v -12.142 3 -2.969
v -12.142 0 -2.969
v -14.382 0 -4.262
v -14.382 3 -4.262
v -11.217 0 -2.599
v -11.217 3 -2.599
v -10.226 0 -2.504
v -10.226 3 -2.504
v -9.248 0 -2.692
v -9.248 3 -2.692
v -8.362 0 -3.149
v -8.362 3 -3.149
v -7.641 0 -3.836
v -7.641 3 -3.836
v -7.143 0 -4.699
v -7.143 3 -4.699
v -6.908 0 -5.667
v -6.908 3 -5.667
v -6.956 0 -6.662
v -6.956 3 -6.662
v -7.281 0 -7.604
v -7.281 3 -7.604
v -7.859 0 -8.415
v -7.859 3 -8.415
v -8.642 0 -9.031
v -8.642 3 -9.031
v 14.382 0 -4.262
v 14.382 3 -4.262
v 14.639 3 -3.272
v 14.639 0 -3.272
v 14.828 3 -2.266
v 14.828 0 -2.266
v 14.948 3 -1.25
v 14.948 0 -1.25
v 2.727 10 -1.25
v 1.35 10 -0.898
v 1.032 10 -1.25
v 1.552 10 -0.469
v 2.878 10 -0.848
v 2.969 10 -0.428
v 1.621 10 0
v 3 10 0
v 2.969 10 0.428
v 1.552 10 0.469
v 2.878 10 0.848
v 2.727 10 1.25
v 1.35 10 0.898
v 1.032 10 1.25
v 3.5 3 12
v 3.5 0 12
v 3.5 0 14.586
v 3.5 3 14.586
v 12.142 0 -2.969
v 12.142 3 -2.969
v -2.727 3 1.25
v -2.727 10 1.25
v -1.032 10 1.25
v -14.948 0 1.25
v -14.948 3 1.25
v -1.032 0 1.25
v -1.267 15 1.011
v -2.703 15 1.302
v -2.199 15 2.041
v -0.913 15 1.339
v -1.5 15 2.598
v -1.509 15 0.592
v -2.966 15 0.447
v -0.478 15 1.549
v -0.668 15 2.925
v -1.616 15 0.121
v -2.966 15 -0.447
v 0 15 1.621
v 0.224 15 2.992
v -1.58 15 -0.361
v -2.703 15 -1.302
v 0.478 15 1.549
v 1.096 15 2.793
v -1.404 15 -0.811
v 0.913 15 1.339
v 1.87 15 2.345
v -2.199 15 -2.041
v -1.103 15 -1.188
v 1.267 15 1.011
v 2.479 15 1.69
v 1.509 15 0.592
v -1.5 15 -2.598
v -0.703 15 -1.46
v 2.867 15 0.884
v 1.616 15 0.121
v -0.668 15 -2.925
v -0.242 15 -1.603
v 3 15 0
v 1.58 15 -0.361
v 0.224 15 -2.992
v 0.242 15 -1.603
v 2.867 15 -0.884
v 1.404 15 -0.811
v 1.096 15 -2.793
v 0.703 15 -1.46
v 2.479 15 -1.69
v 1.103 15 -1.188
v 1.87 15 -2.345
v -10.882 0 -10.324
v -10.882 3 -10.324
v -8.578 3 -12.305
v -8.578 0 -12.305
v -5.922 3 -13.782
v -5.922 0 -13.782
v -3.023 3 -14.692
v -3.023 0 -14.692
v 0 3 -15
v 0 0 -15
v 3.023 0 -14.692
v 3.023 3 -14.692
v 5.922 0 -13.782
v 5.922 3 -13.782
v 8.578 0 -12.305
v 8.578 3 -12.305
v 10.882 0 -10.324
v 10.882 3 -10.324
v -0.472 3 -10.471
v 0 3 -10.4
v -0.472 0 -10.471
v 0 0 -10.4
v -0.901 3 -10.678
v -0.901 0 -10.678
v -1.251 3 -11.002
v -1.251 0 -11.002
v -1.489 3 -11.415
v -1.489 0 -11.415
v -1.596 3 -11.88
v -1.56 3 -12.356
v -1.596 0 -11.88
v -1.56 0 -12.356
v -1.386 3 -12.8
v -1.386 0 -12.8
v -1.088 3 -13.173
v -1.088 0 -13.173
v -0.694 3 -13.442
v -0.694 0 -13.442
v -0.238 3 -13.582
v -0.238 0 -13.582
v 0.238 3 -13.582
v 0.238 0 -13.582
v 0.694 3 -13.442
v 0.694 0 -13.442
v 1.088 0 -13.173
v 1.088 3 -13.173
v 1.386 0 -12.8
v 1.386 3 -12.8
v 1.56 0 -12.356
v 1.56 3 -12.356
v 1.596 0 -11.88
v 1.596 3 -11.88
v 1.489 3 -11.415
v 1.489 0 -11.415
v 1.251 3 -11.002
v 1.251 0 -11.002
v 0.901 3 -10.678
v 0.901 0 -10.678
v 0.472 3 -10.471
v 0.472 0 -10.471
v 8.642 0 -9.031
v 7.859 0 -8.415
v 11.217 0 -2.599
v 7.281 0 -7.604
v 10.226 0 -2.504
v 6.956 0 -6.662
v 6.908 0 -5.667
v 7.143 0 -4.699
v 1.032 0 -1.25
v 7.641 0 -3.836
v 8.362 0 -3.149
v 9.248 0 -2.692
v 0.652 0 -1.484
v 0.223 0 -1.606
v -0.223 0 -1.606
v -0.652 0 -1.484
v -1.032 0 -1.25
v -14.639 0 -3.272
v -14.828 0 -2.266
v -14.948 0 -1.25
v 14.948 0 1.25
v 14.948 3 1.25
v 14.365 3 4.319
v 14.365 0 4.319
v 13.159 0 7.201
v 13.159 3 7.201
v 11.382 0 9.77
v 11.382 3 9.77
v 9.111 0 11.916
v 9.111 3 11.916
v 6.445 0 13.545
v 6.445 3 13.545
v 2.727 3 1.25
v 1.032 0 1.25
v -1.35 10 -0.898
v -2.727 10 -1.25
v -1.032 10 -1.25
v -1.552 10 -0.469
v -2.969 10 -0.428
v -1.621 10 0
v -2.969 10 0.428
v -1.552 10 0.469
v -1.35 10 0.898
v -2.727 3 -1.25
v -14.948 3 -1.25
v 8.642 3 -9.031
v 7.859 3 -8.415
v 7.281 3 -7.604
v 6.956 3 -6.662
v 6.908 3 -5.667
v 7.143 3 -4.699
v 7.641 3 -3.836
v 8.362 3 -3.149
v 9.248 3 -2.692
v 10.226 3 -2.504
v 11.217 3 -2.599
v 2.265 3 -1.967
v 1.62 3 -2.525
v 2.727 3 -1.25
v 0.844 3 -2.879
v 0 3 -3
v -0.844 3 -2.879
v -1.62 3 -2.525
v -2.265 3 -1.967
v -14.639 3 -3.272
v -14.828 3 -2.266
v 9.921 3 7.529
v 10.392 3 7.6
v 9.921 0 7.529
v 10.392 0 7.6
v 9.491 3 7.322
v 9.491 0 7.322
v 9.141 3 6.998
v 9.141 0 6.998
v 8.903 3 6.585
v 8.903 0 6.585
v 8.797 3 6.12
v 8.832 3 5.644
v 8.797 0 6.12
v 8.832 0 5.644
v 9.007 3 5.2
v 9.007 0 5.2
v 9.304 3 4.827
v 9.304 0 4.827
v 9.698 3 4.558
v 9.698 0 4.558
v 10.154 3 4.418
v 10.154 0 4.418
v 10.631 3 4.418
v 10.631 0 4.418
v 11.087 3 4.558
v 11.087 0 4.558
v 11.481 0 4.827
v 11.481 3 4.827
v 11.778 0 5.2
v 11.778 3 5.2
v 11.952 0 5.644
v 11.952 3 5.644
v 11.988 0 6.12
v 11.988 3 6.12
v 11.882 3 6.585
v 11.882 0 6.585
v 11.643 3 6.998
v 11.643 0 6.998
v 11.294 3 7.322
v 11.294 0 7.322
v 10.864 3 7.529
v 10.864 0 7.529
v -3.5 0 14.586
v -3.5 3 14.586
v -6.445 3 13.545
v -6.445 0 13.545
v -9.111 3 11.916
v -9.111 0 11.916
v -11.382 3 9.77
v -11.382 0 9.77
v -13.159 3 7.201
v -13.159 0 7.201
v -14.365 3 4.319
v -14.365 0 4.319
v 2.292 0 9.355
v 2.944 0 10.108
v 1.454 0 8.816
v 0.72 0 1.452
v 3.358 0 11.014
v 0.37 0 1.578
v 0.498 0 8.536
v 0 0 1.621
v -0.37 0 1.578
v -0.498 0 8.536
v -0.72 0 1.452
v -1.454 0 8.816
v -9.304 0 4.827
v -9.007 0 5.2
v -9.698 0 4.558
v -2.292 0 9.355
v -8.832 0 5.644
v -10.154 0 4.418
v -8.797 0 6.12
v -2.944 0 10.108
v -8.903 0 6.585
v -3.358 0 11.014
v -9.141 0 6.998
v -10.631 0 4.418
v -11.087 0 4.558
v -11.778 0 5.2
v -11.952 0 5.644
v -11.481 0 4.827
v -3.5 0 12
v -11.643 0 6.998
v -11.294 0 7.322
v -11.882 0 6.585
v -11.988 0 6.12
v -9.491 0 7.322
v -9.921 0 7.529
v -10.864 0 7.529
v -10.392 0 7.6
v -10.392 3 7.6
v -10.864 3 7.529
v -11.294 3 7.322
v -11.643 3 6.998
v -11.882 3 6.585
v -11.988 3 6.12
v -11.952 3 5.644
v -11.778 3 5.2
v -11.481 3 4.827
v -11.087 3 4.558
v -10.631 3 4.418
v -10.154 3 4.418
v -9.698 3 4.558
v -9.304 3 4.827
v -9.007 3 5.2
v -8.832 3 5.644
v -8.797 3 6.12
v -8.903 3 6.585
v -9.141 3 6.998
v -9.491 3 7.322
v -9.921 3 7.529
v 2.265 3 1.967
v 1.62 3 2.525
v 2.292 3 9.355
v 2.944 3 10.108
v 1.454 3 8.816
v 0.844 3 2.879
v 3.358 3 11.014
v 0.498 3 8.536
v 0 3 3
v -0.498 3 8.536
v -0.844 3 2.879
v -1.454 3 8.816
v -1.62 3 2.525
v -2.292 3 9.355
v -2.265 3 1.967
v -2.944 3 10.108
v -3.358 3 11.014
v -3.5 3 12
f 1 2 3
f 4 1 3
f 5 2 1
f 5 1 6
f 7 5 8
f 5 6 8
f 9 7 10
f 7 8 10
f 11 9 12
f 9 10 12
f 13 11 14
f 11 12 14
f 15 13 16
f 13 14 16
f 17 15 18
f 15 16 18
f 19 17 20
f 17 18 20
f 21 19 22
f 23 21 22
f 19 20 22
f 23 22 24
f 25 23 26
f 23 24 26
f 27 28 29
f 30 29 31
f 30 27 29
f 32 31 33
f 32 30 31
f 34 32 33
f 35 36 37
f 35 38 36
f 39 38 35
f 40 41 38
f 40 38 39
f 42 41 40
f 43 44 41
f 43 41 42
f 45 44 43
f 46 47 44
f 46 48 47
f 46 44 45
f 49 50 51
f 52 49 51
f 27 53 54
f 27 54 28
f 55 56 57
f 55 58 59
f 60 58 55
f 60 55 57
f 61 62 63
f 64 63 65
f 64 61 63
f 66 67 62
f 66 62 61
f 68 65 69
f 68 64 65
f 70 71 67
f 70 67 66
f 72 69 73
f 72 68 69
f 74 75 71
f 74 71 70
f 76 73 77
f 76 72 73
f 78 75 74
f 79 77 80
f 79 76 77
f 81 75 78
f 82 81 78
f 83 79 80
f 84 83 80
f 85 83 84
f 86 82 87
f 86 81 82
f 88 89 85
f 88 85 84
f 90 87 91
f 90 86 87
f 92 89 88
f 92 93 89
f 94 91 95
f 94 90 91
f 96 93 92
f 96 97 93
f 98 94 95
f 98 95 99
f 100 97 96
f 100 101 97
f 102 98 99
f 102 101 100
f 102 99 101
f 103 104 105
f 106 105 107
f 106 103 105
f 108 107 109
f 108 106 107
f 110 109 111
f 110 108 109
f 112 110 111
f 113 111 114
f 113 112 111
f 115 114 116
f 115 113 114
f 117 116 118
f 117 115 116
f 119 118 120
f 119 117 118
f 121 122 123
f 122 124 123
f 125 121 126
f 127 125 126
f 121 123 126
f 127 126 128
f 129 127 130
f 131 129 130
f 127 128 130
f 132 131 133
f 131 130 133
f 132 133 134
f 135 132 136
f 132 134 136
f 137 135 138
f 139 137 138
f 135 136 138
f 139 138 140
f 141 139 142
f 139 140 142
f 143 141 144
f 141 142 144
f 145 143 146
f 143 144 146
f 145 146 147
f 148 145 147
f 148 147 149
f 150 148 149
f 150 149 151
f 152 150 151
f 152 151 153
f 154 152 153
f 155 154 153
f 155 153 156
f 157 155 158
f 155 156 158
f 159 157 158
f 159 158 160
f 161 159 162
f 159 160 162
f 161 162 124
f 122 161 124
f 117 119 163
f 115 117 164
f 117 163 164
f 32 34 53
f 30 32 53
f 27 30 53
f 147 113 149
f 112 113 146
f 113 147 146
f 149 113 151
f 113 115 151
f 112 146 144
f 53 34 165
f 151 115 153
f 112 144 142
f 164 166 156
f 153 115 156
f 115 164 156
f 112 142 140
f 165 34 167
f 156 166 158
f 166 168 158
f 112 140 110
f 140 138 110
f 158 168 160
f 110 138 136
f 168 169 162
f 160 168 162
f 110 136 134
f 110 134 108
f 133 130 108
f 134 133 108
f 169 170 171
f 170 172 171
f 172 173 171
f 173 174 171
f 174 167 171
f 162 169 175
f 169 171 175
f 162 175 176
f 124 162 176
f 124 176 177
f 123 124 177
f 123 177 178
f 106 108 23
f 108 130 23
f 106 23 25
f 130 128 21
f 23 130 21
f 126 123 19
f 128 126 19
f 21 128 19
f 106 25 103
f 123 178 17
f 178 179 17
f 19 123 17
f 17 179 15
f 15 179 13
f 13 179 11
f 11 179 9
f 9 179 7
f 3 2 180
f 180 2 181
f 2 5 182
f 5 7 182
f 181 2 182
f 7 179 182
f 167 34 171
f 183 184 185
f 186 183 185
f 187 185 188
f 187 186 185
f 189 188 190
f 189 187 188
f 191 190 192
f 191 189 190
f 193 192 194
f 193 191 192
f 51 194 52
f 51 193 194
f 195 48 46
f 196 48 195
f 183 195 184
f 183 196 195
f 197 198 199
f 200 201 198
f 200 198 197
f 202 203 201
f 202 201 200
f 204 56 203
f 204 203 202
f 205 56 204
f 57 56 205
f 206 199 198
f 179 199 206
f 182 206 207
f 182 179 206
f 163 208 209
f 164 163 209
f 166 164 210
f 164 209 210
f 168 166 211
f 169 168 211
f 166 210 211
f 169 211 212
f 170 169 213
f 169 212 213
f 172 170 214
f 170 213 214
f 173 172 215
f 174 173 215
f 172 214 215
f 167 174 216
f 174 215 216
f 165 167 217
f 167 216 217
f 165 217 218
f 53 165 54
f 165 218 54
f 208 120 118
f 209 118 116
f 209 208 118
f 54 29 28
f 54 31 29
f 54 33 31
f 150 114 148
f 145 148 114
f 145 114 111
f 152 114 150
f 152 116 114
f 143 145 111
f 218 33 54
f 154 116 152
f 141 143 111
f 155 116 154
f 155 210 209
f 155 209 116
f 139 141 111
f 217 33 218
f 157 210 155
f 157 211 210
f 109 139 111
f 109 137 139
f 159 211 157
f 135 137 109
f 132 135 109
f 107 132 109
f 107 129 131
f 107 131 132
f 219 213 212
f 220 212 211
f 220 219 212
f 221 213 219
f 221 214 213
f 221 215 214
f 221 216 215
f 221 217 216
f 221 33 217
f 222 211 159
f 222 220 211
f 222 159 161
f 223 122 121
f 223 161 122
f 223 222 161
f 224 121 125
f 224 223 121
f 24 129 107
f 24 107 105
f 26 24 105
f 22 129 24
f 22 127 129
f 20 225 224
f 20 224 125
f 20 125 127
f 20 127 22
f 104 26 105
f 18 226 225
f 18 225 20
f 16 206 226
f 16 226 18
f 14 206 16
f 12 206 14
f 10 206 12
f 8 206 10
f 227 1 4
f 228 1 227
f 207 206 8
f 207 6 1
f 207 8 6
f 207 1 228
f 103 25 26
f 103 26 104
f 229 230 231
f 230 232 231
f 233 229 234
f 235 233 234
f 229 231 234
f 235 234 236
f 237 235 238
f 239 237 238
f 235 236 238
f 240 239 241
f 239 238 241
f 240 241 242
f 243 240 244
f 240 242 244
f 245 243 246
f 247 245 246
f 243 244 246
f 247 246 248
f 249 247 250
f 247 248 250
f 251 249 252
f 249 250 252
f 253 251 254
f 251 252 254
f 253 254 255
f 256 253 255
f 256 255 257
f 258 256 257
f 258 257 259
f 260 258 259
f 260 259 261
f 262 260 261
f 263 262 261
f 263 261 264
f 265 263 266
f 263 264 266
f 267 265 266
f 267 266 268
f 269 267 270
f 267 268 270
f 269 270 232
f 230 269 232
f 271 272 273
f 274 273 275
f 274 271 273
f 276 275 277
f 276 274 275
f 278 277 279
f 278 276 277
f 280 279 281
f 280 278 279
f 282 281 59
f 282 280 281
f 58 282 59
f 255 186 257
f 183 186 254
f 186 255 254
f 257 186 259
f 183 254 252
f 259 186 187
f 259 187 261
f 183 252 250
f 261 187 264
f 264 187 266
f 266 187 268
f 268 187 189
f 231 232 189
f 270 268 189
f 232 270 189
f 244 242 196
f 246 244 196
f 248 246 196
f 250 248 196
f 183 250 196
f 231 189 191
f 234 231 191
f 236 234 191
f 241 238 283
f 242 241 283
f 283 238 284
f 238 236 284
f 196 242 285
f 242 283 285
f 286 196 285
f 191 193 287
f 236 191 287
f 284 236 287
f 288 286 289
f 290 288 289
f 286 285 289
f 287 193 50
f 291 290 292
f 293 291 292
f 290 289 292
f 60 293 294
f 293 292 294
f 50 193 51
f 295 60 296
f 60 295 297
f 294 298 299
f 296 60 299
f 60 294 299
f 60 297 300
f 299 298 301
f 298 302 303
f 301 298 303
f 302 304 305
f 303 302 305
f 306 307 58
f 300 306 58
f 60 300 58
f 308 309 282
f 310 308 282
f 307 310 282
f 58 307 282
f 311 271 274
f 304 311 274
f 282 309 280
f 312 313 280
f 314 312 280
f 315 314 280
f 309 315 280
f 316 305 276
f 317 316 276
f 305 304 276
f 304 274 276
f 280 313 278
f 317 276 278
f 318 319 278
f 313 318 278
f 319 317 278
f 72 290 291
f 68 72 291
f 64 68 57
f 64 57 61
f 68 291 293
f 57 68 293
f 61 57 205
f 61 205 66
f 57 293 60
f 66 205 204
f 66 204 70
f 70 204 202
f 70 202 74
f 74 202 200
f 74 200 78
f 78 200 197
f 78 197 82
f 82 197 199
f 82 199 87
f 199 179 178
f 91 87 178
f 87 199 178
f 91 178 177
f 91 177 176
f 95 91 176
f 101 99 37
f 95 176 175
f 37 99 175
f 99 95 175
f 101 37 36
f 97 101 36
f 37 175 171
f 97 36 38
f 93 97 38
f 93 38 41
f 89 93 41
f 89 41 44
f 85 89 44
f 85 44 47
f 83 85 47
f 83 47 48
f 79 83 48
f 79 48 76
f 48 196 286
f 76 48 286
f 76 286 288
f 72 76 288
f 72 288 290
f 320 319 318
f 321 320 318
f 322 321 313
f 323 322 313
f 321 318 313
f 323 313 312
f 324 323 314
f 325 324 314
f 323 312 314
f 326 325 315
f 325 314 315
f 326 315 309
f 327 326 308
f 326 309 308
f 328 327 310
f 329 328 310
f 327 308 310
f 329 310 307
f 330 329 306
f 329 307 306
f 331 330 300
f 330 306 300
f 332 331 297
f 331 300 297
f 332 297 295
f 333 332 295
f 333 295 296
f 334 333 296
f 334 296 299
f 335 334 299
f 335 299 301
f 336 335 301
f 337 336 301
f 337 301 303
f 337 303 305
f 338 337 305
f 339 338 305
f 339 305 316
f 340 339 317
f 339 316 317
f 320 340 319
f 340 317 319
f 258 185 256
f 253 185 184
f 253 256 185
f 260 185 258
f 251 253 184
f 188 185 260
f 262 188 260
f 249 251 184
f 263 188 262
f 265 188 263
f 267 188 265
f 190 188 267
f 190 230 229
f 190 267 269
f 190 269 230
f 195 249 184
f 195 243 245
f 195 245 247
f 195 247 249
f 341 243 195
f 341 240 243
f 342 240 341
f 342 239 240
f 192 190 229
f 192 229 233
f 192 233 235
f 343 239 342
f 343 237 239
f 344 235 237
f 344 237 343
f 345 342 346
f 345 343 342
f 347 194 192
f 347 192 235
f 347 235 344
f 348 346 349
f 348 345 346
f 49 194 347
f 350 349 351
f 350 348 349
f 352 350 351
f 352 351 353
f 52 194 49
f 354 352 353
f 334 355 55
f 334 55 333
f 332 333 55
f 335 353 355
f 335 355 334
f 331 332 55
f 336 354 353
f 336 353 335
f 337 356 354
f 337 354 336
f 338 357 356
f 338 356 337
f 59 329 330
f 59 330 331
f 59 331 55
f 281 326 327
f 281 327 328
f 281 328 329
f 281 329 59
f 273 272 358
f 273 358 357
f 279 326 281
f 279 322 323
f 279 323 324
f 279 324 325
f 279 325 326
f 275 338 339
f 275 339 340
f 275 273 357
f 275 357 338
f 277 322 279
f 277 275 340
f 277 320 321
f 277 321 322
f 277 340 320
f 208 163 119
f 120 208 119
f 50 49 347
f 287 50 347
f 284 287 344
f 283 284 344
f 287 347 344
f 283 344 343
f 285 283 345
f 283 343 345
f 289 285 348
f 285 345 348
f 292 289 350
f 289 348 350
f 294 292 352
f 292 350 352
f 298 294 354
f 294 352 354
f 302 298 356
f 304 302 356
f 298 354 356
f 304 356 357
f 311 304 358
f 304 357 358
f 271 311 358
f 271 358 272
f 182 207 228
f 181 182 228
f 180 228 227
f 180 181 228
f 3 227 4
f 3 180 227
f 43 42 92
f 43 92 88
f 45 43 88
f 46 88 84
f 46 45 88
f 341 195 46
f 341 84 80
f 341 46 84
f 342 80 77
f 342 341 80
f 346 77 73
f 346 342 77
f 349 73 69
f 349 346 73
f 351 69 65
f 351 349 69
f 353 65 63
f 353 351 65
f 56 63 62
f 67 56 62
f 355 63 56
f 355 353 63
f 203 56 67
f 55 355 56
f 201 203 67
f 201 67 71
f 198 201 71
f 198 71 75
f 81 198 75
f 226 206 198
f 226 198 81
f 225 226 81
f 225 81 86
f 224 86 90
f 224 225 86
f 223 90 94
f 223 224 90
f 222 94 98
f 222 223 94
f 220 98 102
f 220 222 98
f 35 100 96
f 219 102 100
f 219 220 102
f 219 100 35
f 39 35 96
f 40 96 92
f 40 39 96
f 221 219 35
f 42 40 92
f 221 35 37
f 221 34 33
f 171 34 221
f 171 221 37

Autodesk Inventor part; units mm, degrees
ref_plane "YZ Plane" through (0, 0, 0) normal (1, 0, 0) x (0, 1, 0)
ref_plane "XZ Plane" through (0, 0, 0) normal (0, 1, 0) x (-1, 0, 0)
ref_plane "XY Plane" through (0, 0, 0) normal (0, 0, 1) x (1, 0, 0)
sketch "Sketch1" plane through (0, 0, 0) normal (0, 1, 0) x (-1, 0, 0)
  circle A0 centre (0, 0) radius 15
  dimension "d0" = 30
extrude "Extrusion1" add sketch "Sketch1" along normal blind 3
sketch "Sketch2" plane through (0, 3, 0) normal (0, 1, 0) x (1, 0, 0)
  circle A0 centre (0, 0) radius 12 construction
  point P0 (0, 12)
  point P1 (-10.3923, -6)
  point P2 (10.3923, -6)
  dimension "d3" = 24
  dimension "d4" = 120
hole "Hole1" at (0, 3, -12) at (-10.3923, 3, 6) at (10.3923, 3, 6) direction (0, -1, 0) diameter 3.2 end through all
sketch "Sketch4" plane through (0, 3, 0) normal (0, 1, 0) x (1, 0, 0)
  circle A0 centre (0, -12) radius 3.5
  circle A1 centre (0, 0) radius 15 projected
  arc A2 (-3.5, -14.586) -> (3.5, -14.586) centre (0, 0) ccw
  line L0 (3.5, -12) -> (3.5, -14.586)
  line L1 (-3.5, -12) -> (-3.5, -14.586)
  dimension "d12" = 7
  dimension "d13" = 12
extrude "Extrusion2" cut sketch "Sketch4" against normal through all contours A0 A1 | L0 A1 A0 | A0 A1 L1 picked at (0.1406, -12.8318)
pattern_circular "Circular Pattern1" count 3 over 360 about axis through (0, 0, 0) along (0, 1, 0) of "Extrusion2"
sketch "Sketch6" plane through (0, 3, 0) normal (0, 1, 0) x (1, 0, 0)
  circle A0 centre (0, 0) radius 3
  dimension "d24" = 6
extrude "Extrusion4" add sketch "Sketch6" along normal blind 12
sketch "Sketch7" plane through (0, 0, 0) normal (0, -1, 0) x (1, 0, 0)
  line L0 (-1.5, 0) -> (63.9289, 0) construction
  line L1 (0, -1.5) -> (62.4289, -1.5)
  line L2 (62.4289, 1.5) -> (0, 1.5)
  arc A0 (0, 1.5) -> (0, -1.5) centre (0, 0) ccw
  arc A1 (62.4289, -1.5) -> (62.4289, 1.5) centre (62.4289, 0) ccw
  point P0 (31.2144, 0)
  dimension "d27" = 3
extrude "Extrusion5" [suppressed]
sketch "Sketch8" plane through (0, 15, 0) normal (0, 1, 0) x (1, 0, 0)
  point P0 (0, 0)
  point P1 (0, 0)
hole "Hole2" at (0, 15, 0) direction (0, -1, 0) diameter 3.242 end through all thread size "M4x0.7" class "6H" standard "ANSI Metric M Profile"
sketch "Sketch9" plane through (0, 0, 0) normal (0, -1, 0) x (1, 0, 0)
  arc A0 (12.1423, -2.9689) -> (8.6423, -9.0311) centre (10.3923, -6) ccw projected
  line L0 (0, 0) -> (10.3923, -6) construction
  line L1 (0, 0) -> (9.8835, -17.1187) construction
  line L2 (0, 0) -> (17.8778, 0) construction
  line L3 (19.4334, 1) -> (1.2758, 1)
  circle A1 centre (0, 0) radius 1.621 projected
  line L4 (-0.2281, -1.6049) -> (7.499, -14.9886)
  arc A2 (-10.8818, -10.3241) -> (10.8818, -10.3241) centre (0, 0) ccw projected
  arc A3 (14.3818, -4.2619) -> (3.5, 14.586) centre (0, 0) ccw projected
  arc A4 (6.6173, -13.4615) -> (14.9666, 1) centre (0, 0) ccw
  point P0 (10.8818, -10.3241)
  point P1 (14.3818, -4.2619)
  dimension "d37" = 30
  dimension "d38" = 30
  dimension "d39" = 1
  dimension "d40" = 1
extrude "Extrusion6" [suppressed]
fillet "Fillet1" [suppressed]
sketch "Sketch10" plane through (0, 0, 0) normal (0, -1, 0) x (1, 0, 0)
  arc A0 (14.3818, -4.2619) -> (3.5, 14.586) centre (0, 0) ccw projected
  line L0 (14.9478, -1.25) -> (-14.9478, -1.25)
  arc A1 (-3.5, 14.586) -> (-14.3818, -4.2619) centre (0, 0) ccw projected
  line L1 (-14.9478, 1.25) -> (14.9478, 1.25)
  arc A2 (-3.5, 14.586) -> (-14.3818, -4.2619) centre (0, 0) ccw projected
  arc A3 (14.9478, -1.25) -> (14.9478, 1.25) centre (0, 0) ccw
  arc A4 (-14.9478, 1.25) -> (-14.9478, -1.25) centre (0, 0) ccw
  dimension "d44" = 1.25
  dimension "d45" = 1.25
extrude "Extrusion7" cut sketch "Sketch10" against normal blind 10
equation "\"d38\" = d37"
equation "\"d40\" = d39"
equation "\"d45\" = d44"
properties part number "torsosc-support-flange-bottom-v2" material "Copper"
